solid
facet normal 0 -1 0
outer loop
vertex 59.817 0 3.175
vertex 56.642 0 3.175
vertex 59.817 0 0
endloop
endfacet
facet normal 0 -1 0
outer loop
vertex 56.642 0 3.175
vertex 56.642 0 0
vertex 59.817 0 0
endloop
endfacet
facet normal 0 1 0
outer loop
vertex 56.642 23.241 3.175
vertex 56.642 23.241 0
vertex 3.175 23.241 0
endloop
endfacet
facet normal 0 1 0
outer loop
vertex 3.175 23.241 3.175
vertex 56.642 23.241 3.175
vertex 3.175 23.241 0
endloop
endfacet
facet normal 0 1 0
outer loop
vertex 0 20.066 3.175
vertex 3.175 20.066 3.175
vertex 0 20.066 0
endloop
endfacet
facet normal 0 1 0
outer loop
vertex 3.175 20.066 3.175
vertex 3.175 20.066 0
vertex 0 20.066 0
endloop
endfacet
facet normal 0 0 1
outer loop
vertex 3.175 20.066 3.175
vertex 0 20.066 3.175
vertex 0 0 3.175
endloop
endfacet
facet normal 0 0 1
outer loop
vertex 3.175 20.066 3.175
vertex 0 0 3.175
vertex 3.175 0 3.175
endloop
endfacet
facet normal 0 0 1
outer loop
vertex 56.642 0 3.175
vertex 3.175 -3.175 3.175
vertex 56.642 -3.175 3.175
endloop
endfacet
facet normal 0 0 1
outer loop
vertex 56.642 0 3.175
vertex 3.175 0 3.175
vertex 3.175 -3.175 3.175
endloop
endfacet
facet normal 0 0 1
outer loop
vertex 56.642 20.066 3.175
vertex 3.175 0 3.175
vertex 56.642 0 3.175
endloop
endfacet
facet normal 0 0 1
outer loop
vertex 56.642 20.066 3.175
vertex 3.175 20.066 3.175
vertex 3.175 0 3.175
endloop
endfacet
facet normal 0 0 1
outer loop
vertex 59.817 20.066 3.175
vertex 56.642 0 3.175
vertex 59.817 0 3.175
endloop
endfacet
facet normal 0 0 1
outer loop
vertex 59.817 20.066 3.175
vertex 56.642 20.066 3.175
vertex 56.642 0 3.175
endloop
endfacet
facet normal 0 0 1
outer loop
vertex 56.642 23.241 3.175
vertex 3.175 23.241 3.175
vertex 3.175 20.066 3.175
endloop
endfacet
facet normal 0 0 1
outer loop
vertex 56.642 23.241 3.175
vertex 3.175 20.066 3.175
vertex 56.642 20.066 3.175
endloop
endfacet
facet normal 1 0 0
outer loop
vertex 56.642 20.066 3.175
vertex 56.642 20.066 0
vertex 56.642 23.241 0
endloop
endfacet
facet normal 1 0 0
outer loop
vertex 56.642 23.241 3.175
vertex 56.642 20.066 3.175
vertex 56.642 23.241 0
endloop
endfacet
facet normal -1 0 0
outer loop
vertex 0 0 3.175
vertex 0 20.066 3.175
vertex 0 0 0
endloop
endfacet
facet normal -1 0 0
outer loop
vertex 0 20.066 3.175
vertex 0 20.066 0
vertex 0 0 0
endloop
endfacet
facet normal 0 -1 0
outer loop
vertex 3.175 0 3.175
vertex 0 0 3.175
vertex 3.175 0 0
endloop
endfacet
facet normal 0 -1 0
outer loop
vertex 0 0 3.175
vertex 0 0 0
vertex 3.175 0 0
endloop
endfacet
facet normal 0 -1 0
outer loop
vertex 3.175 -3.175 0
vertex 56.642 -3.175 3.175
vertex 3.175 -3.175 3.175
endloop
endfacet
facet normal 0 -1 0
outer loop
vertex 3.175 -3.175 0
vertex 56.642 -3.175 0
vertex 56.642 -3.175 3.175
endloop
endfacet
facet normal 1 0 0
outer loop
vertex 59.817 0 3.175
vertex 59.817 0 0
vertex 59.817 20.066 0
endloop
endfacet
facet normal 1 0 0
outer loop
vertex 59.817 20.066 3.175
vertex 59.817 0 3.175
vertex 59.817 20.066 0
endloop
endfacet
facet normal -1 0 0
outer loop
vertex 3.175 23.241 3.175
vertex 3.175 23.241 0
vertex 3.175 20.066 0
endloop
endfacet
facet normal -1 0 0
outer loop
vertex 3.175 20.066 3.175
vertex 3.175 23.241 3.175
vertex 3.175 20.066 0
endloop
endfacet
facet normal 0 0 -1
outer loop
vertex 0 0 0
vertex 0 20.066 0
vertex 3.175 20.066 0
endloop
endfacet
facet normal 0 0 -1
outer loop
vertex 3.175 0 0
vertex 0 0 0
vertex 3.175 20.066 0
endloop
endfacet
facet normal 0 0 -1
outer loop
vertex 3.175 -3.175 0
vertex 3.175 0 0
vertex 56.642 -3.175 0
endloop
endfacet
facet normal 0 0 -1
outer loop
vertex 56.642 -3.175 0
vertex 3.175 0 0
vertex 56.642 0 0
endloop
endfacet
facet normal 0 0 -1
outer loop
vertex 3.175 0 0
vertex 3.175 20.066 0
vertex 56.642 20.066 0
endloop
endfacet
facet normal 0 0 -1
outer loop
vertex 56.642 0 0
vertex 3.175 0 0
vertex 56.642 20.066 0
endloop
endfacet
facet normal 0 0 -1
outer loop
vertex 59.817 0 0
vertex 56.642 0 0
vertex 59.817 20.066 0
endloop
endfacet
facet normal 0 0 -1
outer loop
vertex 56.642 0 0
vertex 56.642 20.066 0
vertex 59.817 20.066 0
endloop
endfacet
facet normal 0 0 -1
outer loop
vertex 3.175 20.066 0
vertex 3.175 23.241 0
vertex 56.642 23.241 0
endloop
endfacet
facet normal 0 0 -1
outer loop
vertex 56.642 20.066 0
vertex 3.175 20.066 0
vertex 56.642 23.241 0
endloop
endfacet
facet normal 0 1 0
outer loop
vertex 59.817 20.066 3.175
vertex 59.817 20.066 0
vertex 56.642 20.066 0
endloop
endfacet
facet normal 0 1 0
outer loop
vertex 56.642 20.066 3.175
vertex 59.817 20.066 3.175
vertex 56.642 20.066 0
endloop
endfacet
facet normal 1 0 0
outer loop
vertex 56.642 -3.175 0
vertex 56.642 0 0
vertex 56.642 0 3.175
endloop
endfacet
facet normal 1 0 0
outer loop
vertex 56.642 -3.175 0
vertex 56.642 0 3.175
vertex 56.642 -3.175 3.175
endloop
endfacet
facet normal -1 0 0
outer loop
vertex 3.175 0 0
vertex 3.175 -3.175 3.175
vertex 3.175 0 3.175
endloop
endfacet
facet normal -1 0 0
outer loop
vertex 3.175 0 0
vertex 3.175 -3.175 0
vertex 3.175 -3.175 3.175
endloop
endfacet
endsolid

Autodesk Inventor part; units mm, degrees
ref_plane "YZ Plane" through (0, 0, 0) normal (1, 0, 0) x (0, 1, 0)
ref_plane "XZ Plane" through (0, 0, 0) normal (0, 1, 0) x (-1, 0, 0)
ref_plane "XY Plane" through (0, 0, 0) normal (0, 0, 1) x (1, 0, 0)
sketch "Sketch1" plane through (0, 0, 0) normal (0, 0, 1) x (1, 0, 0)
  line L0 (0, 0) -> (59.817, 0)
  line L1 (59.817, 0) -> (59.817, 20.066)
  line L2 (59.817, 20.066) -> (0, 20.066)
  line L3 (0, 20.066) -> (0, 0)
  line L4 (3.175, 0) -> (56.642, 0)
  line L5 (56.642, 0) -> (56.642, -3.175)
  line L6 (56.642, -3.175) -> (3.175, -3.175)
  line L7 (3.175, -3.175) -> (3.175, 0)
  line L8 (3.175, 20.066) -> (56.642, 20.066)
  line L9 (56.642, 20.066) -> (56.642, 23.241)
  line L10 (56.642, 23.241) -> (3.175, 23.241)
  line L11 (3.175, 23.241) -> (3.175, 20.066)
  point P0 (3.175, -1.5875)
  point P1 (56.642, 21.6535)
  dimension "d0" = 3.175
  dimension "d1" = 3.175
  dimension "d2" = 3.175
  dimension "d4" = 53.467
  dimension "d5" = 3.175
  dimension "d6" = 3.175
  dimension "d7" = 3.175
  dimension "d8" = 20.066
extrude "Extrusion1" add sketch "Sketch1" along normal blind 3.175
properties part number "servo long side"
